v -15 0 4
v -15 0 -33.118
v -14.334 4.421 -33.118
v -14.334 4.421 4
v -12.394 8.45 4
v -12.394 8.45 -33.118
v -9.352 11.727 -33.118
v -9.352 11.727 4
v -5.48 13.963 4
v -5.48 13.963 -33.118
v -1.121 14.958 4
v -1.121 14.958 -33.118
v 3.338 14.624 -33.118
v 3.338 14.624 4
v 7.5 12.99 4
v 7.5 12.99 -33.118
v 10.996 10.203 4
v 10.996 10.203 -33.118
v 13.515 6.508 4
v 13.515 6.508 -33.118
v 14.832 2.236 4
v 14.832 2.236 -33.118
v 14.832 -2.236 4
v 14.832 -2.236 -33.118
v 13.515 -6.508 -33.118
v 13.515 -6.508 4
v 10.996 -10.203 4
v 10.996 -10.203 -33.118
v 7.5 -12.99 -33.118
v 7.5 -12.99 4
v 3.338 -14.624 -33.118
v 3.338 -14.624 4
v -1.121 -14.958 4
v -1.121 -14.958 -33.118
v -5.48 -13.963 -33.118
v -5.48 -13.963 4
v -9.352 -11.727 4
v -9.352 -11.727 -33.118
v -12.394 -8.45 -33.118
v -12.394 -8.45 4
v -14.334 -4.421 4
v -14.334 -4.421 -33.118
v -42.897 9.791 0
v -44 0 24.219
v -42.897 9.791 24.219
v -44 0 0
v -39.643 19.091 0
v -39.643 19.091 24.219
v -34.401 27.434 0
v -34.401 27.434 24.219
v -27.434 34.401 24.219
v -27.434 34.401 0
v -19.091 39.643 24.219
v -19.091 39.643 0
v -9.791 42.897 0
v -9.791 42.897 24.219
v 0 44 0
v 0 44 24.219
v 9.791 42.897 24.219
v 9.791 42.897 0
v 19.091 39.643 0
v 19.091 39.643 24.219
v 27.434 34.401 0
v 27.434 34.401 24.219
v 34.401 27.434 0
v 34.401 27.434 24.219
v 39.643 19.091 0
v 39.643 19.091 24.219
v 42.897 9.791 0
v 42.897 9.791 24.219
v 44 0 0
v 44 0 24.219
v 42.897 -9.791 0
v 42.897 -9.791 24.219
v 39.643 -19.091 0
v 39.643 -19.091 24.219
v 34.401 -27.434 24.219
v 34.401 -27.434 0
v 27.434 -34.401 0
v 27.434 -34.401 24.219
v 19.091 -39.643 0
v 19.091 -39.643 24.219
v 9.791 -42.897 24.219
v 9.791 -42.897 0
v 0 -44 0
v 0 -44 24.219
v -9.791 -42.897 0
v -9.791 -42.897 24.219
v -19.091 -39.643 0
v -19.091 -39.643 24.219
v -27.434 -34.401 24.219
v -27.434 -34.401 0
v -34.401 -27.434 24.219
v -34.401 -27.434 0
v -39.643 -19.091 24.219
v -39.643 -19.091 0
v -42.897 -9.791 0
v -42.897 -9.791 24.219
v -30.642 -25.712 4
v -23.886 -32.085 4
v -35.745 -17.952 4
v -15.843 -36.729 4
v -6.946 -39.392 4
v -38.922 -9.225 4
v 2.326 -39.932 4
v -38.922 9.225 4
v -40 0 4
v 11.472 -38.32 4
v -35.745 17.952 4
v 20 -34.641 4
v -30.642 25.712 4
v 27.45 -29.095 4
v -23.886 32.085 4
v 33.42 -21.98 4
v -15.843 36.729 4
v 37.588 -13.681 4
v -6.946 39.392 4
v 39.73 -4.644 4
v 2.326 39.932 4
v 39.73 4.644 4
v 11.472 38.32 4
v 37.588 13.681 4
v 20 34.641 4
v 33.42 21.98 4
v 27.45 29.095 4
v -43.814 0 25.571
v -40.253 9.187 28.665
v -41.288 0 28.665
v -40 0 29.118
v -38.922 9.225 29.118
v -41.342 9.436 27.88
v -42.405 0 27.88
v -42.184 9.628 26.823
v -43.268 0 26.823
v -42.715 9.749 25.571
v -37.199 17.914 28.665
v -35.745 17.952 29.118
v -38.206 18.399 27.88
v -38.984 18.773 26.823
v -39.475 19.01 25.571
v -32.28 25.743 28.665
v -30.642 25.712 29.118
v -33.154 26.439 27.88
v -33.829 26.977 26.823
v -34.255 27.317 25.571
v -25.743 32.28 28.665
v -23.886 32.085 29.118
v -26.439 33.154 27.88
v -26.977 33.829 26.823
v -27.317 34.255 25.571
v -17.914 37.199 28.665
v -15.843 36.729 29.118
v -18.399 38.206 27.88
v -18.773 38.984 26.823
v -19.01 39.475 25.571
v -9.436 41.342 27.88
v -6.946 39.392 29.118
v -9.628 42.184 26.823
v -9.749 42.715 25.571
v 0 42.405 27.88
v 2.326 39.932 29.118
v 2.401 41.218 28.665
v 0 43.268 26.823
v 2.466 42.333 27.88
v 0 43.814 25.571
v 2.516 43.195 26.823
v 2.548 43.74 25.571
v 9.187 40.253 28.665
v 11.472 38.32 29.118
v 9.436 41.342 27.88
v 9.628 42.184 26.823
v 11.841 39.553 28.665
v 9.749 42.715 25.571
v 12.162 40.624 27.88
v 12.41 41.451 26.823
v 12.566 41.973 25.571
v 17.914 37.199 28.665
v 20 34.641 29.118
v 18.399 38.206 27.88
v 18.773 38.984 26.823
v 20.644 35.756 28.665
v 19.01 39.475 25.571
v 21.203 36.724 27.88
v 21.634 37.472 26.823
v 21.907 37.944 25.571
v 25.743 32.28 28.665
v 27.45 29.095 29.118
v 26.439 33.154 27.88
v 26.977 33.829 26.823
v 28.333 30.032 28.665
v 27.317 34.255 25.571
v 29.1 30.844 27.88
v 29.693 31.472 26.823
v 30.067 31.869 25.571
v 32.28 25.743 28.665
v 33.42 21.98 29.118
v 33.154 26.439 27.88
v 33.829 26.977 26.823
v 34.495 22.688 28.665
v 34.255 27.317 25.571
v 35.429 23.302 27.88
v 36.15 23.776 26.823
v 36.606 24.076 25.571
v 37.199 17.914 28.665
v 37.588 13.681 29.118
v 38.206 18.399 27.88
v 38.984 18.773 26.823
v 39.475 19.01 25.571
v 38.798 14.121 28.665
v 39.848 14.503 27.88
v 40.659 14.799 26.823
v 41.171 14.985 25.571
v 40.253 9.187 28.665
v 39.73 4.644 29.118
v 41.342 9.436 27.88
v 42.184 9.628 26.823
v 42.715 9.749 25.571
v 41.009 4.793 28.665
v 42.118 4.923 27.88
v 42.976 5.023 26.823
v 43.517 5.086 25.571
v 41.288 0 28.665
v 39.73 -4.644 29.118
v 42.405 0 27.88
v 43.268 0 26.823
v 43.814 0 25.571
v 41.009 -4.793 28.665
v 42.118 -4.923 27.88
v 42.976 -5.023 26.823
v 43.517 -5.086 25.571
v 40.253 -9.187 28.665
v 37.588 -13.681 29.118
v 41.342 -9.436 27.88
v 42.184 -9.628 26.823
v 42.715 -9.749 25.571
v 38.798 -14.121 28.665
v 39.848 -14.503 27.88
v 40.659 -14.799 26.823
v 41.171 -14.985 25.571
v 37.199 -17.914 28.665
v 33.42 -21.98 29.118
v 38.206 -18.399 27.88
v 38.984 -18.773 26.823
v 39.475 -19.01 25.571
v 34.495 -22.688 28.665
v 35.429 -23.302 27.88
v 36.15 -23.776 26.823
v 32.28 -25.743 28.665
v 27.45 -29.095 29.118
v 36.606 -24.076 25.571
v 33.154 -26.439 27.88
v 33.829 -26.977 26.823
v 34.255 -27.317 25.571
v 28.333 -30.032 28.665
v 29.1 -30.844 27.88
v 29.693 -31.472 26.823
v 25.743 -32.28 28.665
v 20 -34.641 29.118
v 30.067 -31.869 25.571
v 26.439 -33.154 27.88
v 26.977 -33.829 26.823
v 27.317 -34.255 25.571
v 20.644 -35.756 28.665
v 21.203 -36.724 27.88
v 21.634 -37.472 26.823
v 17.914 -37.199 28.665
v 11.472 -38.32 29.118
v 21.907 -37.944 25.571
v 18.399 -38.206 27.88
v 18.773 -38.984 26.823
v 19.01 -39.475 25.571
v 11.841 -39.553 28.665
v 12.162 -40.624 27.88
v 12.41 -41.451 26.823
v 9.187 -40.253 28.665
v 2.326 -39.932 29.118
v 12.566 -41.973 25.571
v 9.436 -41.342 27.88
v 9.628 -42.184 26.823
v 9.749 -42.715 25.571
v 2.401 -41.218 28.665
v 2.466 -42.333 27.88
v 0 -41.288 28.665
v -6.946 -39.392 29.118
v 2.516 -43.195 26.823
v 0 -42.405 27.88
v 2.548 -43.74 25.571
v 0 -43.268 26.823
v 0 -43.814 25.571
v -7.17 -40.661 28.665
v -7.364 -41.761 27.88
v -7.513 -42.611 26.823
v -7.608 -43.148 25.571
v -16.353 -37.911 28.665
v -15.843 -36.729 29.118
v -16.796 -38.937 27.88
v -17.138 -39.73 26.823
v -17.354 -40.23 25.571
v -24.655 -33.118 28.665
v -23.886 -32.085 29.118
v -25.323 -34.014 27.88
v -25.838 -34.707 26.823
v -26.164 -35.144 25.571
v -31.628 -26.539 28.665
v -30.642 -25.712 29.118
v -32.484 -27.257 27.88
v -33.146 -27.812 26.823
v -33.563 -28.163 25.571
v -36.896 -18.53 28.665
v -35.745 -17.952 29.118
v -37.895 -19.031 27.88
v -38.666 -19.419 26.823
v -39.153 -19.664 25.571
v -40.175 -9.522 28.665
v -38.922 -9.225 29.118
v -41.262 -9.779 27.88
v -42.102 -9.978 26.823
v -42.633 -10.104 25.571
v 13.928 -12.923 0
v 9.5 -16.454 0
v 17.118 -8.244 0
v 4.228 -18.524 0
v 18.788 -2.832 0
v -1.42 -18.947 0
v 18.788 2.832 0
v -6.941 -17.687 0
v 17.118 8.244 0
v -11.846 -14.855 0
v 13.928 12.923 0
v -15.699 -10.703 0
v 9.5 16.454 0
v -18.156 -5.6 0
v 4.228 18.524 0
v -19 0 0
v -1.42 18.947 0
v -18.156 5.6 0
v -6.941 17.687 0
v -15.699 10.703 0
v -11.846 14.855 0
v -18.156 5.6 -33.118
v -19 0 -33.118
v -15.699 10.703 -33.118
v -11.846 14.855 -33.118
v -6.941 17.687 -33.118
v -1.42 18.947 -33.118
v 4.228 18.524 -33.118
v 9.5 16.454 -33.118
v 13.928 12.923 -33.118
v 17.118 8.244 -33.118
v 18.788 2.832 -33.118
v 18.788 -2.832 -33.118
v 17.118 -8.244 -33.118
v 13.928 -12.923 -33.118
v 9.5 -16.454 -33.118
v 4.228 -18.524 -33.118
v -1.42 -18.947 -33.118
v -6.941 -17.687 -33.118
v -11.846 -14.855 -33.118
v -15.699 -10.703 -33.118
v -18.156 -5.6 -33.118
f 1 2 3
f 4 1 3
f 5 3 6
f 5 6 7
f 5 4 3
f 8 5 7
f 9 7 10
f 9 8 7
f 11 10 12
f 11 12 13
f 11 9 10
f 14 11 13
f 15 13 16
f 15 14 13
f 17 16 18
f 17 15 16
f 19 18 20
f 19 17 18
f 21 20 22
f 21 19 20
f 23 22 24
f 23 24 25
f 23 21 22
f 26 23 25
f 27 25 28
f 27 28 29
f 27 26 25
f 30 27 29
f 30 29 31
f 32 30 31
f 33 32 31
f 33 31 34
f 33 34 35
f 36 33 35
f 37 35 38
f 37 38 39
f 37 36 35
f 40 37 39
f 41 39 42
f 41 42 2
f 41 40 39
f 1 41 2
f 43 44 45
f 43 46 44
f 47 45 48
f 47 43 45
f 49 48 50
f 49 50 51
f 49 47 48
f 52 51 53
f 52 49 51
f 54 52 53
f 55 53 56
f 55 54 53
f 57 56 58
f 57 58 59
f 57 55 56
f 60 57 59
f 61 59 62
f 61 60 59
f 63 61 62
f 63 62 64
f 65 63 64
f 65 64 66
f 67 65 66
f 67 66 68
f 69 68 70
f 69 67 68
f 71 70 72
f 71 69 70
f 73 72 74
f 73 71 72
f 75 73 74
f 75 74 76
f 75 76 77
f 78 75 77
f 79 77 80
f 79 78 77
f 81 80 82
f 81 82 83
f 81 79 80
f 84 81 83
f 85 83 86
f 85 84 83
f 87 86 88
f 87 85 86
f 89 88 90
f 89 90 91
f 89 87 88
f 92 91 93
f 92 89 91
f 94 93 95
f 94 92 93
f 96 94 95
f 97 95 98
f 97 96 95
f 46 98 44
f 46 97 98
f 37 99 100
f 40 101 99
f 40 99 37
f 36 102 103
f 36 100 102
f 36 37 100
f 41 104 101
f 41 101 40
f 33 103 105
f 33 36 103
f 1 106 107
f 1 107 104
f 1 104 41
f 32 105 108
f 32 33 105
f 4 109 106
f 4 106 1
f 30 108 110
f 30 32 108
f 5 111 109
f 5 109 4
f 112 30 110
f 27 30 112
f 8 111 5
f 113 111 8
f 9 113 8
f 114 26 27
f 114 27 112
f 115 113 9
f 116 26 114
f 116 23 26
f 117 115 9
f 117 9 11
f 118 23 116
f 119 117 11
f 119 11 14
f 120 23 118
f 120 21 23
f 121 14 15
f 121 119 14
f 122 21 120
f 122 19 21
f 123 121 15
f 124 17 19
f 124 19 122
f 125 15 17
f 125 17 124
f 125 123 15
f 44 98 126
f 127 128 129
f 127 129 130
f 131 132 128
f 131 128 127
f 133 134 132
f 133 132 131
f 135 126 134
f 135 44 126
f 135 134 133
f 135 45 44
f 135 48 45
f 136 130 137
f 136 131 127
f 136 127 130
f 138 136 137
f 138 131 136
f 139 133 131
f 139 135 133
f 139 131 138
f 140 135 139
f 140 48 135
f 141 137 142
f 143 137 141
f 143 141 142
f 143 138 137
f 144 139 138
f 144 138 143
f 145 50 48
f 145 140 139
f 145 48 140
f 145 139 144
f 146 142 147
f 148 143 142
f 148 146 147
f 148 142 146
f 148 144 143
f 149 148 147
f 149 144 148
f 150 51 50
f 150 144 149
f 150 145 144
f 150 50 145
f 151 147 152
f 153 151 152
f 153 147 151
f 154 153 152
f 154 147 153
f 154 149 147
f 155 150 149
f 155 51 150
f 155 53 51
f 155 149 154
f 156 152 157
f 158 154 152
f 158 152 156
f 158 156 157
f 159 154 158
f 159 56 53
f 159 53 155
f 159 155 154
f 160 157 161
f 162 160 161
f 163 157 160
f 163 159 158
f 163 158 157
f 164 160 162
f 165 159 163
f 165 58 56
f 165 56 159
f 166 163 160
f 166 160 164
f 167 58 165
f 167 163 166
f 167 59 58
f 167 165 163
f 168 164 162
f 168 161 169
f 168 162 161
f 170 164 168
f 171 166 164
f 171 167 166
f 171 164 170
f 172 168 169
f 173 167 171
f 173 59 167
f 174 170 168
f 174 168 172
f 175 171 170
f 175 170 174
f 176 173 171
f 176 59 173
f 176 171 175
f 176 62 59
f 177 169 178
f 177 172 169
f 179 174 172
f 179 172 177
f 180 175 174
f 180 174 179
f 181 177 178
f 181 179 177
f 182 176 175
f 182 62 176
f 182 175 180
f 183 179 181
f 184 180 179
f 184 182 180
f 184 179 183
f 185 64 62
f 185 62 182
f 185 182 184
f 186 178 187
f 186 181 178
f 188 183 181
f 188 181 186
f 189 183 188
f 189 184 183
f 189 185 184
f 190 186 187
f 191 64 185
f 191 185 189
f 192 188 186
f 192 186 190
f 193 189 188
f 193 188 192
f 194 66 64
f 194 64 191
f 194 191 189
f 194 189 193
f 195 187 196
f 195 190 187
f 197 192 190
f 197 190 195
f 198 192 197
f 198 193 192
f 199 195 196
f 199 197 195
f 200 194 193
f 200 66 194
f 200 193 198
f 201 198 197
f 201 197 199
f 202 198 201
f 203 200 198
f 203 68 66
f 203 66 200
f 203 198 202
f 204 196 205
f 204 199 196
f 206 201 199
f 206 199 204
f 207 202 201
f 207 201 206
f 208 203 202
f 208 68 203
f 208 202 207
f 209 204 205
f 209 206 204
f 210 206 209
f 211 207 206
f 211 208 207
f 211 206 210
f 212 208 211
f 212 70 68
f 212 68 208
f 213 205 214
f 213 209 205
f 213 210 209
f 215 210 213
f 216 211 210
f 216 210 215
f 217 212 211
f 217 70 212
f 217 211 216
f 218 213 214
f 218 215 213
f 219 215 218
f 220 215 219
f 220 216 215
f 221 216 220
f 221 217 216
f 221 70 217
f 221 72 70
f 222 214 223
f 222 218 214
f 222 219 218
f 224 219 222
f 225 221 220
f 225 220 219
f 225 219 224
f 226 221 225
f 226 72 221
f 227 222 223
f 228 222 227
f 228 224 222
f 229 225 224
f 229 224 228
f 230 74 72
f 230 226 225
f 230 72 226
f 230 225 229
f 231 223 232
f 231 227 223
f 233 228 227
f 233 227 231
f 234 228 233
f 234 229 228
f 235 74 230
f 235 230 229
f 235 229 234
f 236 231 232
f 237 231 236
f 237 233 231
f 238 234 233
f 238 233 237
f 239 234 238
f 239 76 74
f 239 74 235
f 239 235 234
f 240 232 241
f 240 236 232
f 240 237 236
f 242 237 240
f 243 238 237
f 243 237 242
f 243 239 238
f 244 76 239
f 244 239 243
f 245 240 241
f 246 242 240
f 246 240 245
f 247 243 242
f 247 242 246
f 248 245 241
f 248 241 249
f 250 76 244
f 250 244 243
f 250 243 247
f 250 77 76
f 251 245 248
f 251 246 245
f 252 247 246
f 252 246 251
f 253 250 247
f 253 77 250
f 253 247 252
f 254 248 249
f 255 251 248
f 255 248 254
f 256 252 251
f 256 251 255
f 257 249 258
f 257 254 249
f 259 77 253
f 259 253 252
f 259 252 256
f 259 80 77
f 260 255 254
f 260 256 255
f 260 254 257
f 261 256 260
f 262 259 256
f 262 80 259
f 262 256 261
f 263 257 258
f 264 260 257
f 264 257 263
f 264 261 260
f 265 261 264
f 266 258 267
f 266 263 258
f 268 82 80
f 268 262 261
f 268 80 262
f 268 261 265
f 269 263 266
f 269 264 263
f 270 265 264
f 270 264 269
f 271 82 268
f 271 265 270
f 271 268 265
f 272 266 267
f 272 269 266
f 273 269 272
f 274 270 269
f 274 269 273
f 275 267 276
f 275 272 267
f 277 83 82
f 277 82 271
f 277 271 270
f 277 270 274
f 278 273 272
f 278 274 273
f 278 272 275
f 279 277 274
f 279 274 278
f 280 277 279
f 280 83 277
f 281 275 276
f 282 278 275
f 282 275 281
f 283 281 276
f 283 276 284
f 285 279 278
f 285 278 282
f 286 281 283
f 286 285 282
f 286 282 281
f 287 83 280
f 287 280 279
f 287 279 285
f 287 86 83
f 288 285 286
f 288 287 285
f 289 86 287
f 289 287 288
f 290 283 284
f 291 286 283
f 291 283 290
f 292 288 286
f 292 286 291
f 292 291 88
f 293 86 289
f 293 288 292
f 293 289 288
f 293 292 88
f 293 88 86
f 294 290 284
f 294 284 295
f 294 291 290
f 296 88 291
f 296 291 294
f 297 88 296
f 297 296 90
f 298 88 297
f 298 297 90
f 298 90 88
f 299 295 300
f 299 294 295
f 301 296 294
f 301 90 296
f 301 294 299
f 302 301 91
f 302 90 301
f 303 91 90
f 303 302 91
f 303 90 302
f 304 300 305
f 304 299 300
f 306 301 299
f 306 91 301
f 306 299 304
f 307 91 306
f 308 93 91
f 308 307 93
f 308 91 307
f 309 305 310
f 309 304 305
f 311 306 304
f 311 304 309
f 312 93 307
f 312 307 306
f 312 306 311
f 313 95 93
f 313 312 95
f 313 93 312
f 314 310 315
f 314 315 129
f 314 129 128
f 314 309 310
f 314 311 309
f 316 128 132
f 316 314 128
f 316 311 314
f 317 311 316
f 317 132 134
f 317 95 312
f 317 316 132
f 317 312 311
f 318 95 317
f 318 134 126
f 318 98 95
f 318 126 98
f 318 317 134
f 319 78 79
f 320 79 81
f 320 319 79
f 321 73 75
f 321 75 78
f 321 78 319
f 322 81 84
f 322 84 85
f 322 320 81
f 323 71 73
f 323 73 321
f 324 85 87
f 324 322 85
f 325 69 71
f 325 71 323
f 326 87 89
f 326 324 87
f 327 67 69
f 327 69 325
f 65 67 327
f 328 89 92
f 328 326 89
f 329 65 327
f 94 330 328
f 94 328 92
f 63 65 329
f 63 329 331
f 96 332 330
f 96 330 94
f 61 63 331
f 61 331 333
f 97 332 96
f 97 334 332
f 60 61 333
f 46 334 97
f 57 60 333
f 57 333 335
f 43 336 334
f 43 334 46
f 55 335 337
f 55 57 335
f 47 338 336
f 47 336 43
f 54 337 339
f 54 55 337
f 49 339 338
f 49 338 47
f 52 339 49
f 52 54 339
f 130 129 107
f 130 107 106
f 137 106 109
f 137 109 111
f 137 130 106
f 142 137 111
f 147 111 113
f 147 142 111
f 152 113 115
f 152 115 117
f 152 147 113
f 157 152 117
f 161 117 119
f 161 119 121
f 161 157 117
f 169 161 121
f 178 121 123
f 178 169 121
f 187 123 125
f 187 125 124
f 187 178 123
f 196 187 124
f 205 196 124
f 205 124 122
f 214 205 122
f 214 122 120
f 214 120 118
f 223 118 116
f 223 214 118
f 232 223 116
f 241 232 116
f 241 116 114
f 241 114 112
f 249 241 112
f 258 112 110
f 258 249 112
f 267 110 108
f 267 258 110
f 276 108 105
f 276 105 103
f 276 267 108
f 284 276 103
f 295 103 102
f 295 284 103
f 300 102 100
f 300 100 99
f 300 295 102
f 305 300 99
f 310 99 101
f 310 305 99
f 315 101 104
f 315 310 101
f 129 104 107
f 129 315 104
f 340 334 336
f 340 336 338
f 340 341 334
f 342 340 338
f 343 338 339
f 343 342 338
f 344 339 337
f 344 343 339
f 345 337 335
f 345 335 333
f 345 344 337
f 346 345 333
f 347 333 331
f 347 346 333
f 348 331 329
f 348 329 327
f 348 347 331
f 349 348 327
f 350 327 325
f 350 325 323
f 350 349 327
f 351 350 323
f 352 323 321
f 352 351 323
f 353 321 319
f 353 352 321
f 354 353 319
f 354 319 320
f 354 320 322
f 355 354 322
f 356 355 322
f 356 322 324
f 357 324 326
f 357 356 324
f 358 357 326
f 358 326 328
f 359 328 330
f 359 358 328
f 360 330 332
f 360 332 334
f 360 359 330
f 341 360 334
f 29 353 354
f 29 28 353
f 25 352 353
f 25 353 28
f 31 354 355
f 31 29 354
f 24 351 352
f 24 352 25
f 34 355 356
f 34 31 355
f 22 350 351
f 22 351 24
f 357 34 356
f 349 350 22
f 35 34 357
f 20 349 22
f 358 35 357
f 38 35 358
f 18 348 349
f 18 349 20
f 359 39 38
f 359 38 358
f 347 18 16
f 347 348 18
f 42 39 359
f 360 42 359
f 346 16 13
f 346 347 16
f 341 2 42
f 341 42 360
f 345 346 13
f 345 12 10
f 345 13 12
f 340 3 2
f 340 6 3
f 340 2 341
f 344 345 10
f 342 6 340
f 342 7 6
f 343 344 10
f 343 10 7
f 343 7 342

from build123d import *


# Not quite as in the source:
# - a fillet or chamfer that OpenCascade refuses, or shapes differently, is made with other operations: its cross-section is extruded or revolved along the edge and cut away or added


with BuildPart() as f1:
    # F0 (on Front) → F1 (revolve)
    with BuildSketch(Plane.XZ):
        Polygon((-40, 29.117645719), (-44, 29.117645719), (-44, 0), (-19, 0), (-19, -33.1176439325), (-15, -33.1176439325), (-15, 4), (-40, 4), align=None)
    revolve(axis=Axis((0, 0, -0.9199753404), (0, 0, -1)))

    # F2: fillet of radius 5 on 1 edges, made by hand

    # F2_s1 → F2_t2 (revolve, cut)
    with BuildSketch(Plane.XZ):
        with BuildLine():
            ThreePointArc((-40, 29.117645719), (-42.8729833462, 27.3809438936), (-44, 24.2186662334))
            Line((-44, 24.2186662334), (-44, 29.117645719))
            Line((-44, 29.117645719), (-40, 29.117645719))
        make_face()
    revolve(axis=Axis((0, 0, 29.117645719), (0, 0, -1)), mode=Mode.SUBTRACT)


solid = f1.part
